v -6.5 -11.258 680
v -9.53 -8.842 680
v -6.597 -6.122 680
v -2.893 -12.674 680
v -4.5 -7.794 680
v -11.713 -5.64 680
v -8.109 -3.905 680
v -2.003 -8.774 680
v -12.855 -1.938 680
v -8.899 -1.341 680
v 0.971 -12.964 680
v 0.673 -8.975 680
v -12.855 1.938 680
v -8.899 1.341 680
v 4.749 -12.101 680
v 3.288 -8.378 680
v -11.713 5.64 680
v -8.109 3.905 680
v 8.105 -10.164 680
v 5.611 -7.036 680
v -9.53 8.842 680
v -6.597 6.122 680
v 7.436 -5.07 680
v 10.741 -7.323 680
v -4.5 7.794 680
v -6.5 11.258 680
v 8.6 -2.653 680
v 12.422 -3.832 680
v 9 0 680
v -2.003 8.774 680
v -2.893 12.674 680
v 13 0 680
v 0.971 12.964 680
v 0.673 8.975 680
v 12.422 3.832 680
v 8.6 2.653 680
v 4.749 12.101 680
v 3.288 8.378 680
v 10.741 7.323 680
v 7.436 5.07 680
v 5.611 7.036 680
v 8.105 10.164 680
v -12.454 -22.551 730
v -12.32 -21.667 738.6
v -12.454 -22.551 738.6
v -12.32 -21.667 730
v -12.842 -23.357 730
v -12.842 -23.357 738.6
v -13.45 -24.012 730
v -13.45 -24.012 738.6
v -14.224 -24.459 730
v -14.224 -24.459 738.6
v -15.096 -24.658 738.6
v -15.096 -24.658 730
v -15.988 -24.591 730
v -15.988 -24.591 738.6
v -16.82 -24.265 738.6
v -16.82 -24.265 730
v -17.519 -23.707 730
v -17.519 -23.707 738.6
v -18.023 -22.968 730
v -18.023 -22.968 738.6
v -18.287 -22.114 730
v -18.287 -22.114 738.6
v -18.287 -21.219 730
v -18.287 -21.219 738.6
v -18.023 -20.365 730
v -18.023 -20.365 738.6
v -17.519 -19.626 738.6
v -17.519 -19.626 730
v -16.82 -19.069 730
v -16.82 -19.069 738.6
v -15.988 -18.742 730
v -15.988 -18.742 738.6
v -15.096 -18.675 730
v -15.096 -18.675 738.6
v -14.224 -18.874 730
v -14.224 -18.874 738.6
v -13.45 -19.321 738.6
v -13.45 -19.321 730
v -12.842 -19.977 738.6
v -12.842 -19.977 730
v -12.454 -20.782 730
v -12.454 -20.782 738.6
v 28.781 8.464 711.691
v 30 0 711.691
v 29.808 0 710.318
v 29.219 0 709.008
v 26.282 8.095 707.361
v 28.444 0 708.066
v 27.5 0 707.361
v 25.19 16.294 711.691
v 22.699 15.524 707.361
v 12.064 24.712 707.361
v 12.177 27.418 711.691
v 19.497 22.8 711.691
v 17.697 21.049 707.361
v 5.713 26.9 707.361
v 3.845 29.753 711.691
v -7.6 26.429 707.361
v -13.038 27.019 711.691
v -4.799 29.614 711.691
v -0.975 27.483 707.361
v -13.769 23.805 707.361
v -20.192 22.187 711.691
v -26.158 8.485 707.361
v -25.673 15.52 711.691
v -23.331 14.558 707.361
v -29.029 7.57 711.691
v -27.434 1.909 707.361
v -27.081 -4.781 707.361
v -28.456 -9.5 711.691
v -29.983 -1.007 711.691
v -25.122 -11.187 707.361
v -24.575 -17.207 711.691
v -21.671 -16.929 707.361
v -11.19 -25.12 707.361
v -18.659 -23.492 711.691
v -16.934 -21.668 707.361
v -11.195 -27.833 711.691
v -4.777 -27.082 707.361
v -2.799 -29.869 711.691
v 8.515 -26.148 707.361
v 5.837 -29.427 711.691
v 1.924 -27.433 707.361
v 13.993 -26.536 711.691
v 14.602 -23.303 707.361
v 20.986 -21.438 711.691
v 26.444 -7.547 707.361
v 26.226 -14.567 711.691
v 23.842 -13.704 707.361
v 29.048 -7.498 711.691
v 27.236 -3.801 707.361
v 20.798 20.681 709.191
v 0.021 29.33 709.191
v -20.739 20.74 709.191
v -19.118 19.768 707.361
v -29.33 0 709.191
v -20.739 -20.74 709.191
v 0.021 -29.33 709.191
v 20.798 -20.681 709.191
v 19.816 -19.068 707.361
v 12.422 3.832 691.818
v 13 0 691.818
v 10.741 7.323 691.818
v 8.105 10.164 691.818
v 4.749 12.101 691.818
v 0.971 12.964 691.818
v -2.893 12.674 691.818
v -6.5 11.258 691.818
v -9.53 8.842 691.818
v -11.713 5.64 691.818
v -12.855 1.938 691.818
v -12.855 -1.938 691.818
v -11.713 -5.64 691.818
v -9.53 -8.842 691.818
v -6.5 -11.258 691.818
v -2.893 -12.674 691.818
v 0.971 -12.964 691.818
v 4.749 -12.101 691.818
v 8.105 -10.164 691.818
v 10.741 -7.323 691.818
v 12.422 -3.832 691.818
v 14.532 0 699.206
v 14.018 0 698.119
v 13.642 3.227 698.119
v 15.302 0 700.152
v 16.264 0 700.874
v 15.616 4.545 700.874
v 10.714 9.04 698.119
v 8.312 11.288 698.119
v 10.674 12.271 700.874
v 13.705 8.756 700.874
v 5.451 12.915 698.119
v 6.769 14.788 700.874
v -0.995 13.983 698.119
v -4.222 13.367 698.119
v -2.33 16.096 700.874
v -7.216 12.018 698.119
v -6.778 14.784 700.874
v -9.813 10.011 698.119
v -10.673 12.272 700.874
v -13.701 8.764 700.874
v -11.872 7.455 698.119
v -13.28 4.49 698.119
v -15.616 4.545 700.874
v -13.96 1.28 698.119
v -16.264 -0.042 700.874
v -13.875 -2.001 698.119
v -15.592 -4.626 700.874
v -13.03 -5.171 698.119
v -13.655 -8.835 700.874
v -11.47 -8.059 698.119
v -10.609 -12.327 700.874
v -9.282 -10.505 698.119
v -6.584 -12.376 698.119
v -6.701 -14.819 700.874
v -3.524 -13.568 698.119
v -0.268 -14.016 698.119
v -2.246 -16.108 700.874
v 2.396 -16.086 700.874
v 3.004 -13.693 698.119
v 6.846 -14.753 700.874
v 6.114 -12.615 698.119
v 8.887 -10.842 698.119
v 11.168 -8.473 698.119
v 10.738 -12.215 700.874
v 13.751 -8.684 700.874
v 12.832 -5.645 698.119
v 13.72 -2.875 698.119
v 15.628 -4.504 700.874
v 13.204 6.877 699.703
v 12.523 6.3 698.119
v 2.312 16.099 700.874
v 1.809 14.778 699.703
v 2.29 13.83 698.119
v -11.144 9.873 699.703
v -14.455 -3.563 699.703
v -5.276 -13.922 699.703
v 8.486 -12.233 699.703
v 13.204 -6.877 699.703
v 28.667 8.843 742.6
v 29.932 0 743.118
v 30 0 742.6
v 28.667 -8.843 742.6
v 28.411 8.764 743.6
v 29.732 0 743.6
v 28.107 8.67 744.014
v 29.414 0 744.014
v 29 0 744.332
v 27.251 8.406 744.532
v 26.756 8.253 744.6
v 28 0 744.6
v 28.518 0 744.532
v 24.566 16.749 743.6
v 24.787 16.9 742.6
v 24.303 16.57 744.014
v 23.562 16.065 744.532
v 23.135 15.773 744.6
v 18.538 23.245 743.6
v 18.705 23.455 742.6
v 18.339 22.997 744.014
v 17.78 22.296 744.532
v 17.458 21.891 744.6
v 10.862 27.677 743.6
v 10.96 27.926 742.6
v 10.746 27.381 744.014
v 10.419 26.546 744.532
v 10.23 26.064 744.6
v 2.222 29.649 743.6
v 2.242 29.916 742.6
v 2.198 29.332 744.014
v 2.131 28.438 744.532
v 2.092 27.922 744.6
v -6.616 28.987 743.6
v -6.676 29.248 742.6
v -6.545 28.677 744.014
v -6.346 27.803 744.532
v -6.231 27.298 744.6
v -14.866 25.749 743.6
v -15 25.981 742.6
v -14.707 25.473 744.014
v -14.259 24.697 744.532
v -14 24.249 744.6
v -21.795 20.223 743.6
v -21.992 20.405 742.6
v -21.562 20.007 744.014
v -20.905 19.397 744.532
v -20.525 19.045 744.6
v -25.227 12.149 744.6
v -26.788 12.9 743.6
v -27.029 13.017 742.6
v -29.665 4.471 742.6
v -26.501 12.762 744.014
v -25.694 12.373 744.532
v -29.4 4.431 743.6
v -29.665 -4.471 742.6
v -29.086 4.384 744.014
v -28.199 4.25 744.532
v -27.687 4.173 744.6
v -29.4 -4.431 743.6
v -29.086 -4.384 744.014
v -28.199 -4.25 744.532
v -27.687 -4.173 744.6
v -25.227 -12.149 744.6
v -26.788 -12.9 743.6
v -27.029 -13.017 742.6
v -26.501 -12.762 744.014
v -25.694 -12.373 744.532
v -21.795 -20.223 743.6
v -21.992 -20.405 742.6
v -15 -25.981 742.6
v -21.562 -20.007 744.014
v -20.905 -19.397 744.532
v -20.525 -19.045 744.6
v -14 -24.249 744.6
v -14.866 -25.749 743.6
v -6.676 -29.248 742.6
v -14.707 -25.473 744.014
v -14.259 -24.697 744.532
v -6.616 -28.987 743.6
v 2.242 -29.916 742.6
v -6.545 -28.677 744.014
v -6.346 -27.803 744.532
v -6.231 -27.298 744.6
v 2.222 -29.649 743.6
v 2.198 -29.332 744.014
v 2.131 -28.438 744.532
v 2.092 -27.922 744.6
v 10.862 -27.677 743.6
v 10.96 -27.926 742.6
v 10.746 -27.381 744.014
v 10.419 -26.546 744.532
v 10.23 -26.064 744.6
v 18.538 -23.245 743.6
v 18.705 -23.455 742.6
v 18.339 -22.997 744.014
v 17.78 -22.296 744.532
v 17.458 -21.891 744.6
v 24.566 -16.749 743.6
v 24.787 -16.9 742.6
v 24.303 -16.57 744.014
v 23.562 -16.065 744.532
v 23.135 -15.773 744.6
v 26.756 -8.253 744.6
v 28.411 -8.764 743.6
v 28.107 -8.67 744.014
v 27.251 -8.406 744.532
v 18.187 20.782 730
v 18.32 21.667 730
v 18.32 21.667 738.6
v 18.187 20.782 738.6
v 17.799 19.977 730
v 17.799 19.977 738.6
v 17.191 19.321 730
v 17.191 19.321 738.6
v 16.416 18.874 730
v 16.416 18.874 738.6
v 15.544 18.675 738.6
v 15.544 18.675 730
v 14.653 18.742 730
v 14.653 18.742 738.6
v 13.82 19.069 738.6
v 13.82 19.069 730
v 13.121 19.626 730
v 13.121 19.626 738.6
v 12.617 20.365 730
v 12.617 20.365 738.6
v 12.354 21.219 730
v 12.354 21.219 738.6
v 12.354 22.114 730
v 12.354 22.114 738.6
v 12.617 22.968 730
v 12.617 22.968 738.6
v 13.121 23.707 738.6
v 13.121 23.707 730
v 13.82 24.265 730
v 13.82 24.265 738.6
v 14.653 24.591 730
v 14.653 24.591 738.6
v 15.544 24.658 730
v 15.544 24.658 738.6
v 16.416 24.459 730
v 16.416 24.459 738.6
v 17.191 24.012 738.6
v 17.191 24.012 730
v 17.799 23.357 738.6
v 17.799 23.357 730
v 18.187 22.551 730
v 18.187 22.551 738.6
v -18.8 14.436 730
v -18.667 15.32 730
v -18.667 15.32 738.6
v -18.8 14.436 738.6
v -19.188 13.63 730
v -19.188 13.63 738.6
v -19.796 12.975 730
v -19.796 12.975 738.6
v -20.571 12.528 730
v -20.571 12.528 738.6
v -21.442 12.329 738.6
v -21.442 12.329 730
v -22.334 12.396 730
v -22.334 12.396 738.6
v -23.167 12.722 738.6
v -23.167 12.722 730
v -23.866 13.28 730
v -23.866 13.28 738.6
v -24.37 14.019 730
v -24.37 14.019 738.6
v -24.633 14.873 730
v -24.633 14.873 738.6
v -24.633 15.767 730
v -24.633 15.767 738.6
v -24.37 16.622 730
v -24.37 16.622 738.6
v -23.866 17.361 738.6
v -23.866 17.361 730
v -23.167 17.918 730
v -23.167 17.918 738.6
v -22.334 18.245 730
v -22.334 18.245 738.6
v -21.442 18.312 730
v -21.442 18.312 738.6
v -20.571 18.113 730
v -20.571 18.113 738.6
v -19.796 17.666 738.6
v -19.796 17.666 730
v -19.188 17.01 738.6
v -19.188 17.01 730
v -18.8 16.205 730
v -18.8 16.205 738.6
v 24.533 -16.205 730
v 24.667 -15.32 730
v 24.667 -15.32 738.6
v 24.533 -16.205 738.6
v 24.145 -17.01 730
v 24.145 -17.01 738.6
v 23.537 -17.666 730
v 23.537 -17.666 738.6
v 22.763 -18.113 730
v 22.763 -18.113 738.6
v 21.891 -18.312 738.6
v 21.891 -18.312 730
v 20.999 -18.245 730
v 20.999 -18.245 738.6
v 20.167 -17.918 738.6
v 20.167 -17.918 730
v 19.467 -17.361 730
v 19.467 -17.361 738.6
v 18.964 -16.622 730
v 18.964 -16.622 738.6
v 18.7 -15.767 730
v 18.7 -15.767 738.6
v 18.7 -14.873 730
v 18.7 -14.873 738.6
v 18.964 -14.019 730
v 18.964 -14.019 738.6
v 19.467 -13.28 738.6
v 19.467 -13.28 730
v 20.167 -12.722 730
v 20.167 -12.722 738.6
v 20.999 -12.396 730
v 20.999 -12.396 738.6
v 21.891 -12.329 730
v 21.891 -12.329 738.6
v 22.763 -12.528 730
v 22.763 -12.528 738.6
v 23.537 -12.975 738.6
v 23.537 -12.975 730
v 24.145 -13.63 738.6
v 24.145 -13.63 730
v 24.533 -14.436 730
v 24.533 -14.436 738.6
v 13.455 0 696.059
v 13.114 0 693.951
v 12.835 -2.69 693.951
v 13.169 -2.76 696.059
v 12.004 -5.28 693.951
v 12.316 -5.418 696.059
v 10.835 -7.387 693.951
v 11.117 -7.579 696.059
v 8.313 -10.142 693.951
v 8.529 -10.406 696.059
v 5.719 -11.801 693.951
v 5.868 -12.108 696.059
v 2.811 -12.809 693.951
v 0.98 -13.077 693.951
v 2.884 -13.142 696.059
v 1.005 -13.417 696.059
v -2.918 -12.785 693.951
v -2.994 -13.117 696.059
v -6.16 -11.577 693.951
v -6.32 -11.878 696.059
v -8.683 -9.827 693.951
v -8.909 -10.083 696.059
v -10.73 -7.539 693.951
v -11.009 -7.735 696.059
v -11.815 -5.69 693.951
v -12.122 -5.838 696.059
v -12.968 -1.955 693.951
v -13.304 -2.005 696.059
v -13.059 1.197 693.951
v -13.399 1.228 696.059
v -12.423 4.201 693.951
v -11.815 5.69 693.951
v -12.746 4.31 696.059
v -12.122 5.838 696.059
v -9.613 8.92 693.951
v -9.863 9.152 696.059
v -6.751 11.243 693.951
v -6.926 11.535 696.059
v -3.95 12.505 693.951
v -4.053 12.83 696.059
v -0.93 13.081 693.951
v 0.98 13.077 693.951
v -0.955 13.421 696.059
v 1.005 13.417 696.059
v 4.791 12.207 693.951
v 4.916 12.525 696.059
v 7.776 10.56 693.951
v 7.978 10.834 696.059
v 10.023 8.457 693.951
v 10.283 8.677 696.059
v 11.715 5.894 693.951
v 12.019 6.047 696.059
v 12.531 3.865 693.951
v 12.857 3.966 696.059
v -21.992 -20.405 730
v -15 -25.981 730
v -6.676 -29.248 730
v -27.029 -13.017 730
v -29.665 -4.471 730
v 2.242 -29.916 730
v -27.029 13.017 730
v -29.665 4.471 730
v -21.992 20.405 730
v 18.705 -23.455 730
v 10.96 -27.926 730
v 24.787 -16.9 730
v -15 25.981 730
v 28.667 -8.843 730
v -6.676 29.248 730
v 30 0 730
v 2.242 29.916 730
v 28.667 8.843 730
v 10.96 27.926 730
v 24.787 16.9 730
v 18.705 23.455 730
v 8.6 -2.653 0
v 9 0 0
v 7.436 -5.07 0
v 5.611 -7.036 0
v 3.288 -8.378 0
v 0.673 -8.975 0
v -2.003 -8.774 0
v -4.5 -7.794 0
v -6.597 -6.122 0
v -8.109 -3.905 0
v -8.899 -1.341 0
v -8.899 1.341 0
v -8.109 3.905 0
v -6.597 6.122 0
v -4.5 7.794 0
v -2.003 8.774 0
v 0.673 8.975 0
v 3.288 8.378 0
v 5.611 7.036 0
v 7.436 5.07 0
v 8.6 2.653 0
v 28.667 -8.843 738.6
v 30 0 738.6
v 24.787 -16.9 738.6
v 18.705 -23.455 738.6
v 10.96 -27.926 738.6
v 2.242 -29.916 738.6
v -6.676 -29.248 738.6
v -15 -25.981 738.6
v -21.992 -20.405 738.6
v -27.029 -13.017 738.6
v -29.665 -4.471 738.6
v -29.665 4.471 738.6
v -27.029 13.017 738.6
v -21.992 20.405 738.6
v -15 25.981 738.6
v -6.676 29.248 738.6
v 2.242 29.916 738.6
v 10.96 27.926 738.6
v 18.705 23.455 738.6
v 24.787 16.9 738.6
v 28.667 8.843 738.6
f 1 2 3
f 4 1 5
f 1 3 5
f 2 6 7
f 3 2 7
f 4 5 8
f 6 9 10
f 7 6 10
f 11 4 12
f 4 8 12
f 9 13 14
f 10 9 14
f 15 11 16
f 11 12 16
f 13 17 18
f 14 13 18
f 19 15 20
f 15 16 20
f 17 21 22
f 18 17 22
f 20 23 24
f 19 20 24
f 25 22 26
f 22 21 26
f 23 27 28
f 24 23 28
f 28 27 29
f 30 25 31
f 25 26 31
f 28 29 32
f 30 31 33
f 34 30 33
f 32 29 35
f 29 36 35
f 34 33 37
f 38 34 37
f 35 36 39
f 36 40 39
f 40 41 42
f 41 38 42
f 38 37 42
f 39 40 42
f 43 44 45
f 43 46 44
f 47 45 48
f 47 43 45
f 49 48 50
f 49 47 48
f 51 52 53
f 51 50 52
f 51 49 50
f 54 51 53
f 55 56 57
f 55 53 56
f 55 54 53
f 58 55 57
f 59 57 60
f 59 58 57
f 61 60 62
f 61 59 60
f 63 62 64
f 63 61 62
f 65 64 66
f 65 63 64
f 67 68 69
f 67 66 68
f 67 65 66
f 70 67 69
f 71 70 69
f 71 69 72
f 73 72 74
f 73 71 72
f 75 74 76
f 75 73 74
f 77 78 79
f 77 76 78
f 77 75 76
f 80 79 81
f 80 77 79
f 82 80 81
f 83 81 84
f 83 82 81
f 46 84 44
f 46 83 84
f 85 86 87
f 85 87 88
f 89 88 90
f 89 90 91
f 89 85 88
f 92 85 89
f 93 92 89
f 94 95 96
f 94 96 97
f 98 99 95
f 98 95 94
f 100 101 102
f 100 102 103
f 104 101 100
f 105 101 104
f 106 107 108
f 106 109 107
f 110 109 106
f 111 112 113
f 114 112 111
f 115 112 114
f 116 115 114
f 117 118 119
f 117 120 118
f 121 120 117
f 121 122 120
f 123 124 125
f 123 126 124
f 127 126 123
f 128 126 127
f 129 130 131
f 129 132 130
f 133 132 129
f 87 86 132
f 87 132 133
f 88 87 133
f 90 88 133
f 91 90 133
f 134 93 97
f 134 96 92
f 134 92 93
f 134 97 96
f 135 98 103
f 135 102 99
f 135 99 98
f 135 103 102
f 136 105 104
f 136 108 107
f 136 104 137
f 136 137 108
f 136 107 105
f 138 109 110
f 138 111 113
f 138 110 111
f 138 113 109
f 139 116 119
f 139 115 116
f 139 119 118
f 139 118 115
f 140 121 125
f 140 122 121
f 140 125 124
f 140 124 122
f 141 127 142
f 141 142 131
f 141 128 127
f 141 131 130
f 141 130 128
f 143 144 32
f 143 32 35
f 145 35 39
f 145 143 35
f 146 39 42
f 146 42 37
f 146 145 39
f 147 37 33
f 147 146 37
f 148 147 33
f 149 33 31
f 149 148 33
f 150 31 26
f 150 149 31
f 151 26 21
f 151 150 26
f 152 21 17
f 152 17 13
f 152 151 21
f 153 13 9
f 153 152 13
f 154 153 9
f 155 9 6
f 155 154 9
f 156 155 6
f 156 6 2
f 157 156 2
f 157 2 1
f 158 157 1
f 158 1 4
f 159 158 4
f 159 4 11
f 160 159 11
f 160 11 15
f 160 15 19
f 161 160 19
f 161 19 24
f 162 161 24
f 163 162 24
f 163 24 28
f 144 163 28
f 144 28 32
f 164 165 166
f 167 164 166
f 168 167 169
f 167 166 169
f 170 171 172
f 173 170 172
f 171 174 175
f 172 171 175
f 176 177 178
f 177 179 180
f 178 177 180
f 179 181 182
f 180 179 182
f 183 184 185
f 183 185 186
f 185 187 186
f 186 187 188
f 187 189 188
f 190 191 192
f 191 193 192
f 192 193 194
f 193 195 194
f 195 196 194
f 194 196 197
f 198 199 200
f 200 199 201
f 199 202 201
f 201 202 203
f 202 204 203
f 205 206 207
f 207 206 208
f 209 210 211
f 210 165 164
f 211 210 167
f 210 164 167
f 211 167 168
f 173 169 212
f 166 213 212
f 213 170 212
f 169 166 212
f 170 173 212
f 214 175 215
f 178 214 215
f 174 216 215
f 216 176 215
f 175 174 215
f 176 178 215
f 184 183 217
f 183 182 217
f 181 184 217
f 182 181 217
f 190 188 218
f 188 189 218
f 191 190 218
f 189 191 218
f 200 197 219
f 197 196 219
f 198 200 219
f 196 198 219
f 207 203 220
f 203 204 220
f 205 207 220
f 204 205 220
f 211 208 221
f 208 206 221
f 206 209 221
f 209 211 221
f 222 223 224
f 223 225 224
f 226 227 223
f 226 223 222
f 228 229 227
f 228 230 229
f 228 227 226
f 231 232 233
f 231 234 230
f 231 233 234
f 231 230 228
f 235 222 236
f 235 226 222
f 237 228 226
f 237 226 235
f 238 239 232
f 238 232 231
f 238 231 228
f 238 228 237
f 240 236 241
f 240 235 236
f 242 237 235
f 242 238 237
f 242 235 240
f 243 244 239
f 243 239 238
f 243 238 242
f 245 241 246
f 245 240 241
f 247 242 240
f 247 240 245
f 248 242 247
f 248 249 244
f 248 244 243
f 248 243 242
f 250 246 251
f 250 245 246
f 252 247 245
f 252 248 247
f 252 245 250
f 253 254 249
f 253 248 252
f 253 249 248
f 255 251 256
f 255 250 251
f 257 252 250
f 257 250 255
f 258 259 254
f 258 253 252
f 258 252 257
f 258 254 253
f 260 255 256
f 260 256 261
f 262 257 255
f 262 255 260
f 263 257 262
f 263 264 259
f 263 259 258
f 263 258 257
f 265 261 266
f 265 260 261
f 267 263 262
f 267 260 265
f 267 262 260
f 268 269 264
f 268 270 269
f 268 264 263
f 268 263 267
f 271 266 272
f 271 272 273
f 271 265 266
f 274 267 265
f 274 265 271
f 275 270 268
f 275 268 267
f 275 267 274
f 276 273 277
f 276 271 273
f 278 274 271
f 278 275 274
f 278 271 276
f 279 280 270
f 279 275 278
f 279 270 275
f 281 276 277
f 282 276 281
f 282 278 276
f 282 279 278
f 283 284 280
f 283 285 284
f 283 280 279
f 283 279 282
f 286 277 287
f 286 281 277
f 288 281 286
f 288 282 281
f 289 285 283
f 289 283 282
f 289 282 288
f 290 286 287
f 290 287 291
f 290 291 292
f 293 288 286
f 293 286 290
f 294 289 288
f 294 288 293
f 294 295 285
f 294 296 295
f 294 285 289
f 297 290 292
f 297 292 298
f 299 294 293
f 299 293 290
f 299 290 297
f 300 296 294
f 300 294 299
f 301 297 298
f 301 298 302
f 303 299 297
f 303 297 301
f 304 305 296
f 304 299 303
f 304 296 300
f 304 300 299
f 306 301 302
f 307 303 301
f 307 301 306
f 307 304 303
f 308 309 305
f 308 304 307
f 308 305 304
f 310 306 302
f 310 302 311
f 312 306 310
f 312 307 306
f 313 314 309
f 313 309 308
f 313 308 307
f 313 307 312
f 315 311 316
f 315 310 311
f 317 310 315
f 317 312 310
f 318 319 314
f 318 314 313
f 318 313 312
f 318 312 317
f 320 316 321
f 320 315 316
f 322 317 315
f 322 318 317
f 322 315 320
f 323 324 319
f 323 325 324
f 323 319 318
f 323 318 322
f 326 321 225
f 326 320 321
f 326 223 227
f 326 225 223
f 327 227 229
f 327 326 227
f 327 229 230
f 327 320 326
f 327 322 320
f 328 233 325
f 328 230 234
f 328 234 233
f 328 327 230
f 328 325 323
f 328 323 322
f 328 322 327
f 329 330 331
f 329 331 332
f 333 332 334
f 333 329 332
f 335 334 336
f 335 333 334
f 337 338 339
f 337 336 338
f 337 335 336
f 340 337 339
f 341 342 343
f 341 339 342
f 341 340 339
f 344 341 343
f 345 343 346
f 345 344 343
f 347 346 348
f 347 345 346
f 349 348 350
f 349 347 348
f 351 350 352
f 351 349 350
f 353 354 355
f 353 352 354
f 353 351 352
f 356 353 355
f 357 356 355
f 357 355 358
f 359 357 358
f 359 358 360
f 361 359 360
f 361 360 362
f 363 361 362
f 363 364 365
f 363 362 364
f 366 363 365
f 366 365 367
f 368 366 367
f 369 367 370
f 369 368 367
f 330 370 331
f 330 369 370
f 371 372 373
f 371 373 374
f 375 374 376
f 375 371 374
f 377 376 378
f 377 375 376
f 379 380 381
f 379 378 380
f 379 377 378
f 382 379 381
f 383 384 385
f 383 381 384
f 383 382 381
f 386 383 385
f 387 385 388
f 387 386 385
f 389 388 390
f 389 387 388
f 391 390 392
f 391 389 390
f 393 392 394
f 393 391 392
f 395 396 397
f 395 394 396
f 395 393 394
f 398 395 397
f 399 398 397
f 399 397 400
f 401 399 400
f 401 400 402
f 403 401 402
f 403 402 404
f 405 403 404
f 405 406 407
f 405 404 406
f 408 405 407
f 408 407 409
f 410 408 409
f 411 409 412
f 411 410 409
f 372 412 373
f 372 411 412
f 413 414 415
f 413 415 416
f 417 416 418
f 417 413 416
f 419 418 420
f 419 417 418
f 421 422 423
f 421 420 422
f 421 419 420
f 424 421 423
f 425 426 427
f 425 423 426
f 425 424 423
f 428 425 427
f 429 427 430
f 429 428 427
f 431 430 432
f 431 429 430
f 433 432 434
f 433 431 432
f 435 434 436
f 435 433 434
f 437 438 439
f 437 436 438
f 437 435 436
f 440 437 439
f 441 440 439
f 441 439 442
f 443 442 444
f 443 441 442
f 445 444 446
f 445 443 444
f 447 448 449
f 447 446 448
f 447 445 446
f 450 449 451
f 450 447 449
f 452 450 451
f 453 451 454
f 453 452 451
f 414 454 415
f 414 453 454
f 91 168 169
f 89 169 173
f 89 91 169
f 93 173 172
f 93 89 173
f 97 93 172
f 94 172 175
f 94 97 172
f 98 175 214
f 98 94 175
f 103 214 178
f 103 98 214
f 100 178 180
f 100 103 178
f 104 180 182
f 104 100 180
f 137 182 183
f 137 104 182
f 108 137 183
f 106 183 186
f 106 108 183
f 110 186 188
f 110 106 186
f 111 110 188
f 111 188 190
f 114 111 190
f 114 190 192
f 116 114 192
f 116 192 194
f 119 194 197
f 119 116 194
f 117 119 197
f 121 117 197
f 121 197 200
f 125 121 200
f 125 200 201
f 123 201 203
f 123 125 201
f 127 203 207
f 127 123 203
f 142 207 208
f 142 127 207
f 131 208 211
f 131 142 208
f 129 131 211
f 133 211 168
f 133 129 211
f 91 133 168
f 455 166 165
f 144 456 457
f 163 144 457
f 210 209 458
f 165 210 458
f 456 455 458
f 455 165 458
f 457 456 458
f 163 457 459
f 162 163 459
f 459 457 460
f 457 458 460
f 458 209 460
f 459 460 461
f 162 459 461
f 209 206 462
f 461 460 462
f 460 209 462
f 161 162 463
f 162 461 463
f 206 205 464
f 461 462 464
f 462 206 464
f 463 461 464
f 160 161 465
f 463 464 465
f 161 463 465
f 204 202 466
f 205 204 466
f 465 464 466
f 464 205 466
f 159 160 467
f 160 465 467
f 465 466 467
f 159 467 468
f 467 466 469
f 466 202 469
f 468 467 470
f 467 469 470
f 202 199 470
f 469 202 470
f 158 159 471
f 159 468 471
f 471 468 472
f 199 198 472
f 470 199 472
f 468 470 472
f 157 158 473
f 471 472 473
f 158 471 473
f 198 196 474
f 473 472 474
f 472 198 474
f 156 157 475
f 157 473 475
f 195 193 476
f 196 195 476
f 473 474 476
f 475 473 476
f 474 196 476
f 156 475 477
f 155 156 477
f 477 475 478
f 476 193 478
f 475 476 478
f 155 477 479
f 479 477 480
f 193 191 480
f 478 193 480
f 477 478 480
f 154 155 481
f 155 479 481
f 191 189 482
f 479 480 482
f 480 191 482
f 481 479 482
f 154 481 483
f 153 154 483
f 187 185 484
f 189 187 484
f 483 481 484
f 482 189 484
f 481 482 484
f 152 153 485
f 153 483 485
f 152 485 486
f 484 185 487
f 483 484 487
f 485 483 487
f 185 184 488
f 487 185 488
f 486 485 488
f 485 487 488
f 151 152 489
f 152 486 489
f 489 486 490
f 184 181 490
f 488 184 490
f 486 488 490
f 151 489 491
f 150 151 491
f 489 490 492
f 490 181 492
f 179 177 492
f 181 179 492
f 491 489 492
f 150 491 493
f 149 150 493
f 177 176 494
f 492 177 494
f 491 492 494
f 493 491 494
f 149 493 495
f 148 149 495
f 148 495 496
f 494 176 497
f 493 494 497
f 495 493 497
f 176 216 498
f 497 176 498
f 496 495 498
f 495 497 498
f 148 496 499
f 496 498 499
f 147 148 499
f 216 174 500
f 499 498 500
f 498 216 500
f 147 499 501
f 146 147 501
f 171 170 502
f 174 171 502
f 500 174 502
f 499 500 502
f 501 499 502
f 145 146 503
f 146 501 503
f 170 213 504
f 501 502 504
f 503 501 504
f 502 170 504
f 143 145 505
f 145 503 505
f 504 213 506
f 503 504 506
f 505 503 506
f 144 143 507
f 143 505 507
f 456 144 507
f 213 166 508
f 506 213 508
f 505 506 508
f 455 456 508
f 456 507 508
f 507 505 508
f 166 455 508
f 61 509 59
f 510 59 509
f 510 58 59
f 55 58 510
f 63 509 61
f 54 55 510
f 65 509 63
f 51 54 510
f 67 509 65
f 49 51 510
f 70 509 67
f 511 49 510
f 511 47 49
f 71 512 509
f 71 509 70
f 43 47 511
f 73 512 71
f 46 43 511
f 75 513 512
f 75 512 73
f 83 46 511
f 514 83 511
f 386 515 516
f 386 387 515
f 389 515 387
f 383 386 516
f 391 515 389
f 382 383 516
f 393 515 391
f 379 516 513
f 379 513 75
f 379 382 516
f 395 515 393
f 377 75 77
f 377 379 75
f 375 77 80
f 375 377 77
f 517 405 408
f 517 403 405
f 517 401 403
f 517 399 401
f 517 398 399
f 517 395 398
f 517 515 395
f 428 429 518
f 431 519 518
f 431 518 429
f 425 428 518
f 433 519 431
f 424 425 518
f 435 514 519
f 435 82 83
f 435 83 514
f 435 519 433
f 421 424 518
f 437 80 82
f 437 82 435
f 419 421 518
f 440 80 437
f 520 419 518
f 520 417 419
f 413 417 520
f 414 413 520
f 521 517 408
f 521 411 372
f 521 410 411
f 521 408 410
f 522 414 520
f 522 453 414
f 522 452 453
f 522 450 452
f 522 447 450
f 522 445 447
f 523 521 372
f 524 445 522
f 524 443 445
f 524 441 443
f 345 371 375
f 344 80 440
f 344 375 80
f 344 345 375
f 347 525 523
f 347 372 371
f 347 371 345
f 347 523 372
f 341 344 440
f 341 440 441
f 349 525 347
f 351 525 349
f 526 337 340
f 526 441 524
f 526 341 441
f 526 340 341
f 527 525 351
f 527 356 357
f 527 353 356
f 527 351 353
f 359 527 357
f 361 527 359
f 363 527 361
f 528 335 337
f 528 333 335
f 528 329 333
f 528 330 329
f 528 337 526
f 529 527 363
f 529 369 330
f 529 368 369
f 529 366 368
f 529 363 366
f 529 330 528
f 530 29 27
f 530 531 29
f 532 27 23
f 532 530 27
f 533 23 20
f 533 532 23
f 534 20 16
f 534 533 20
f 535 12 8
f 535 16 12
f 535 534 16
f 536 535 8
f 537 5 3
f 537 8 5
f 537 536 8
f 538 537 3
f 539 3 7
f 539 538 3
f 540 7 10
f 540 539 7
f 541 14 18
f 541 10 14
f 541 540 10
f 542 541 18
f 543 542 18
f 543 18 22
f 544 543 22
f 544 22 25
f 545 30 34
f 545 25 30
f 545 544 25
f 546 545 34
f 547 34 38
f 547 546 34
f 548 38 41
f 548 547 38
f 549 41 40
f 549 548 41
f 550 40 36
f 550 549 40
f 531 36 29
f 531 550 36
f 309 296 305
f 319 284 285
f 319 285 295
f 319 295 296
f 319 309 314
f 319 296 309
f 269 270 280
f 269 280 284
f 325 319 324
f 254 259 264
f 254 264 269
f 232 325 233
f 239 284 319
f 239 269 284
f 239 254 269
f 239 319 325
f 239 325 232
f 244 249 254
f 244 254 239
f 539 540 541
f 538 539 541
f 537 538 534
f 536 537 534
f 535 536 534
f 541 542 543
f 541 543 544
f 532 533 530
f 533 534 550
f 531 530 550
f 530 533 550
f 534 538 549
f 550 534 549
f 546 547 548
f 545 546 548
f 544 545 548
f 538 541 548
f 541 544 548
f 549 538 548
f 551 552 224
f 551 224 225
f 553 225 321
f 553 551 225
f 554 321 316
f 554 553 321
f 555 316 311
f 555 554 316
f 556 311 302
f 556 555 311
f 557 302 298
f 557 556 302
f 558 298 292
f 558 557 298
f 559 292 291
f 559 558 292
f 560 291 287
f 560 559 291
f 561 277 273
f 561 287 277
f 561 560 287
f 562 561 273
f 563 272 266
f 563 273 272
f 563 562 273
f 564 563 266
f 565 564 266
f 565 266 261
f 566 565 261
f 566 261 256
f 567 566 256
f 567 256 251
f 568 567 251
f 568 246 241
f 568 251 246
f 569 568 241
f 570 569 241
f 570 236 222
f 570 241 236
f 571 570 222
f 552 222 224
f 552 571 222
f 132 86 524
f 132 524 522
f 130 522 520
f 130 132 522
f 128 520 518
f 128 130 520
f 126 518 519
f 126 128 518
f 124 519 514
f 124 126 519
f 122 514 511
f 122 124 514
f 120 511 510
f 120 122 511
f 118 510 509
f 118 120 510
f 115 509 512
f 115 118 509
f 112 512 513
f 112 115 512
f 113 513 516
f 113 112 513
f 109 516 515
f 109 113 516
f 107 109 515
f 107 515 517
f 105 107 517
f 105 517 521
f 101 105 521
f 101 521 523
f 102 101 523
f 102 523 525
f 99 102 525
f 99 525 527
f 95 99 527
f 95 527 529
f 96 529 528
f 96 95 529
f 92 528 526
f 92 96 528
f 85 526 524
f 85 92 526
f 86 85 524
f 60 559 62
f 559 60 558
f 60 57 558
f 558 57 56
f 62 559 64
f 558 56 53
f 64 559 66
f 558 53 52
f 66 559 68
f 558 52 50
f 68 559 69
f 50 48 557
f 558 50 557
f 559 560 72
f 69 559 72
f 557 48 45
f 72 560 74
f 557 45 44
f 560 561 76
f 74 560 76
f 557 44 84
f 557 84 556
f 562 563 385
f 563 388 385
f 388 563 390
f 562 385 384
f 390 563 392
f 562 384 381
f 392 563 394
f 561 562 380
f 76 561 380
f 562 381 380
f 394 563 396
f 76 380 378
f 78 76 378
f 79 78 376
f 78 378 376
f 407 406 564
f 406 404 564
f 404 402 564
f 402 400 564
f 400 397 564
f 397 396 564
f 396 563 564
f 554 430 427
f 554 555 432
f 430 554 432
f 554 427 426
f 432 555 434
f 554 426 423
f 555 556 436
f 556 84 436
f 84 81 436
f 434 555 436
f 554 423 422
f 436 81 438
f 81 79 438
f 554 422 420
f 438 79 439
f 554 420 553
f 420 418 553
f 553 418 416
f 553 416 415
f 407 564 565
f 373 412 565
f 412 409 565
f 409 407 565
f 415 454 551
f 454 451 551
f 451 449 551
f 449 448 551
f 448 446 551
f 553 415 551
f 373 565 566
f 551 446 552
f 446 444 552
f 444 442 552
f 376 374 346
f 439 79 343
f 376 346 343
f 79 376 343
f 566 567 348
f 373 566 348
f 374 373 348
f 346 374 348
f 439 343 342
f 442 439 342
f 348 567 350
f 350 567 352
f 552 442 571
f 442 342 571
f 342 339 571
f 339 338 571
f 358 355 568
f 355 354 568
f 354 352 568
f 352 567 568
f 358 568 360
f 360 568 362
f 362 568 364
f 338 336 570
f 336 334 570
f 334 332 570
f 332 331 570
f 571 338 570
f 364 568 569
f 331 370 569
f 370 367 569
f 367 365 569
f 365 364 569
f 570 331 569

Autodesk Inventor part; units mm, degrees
ref_plane "YZ Plane" through (0, 0, 0) normal (1, 0, 0) x (0, 1, 0)
ref_plane "XZ Plane" through (0, 0, 0) normal (0, 1, 0) x (-1, 0, 0)
ref_plane "XY Plane" through (0, 0, 0) normal (0, 0, 1) x (1, 0, 0)
sketch "Sketch1" plane through (0, 0, 0) normal (0, 0, 1) x (1, 0, 0)
  circle A0 centre (0, 0) radius 9
  dimension "d0" = 18
extrude "Extrusion1" add sketch "Sketch1" along normal blind 700
sketch "Sketch2" plane through (0, 0, 700) normal (0, 0, 1) x (1, 0, 0)
  circle A0 centre (0, 0) radius 9 projected
  circle A1 centre (0, 0) radius 30
  circle A2 centre (0, 0) radius 13
  dimension "d3" = 60
  dimension "d33" = 26
extrude "Extrusion2" add sketch "Sketch2" along normal blind 30 contours A0 | A1 | A2
sketch "Sketch3" plane through (0, 0, 730) normal (0, 0, 1) x (1, 0, 0)
  circle A0 centre (0, 0) radius 30 projected
  line L0 (-24.495, 17.3203) -> (0, 0) construction
  line L1 (24.495, -17.3203) -> (0, 0) construction
  line L2 (0, 0) -> (17.3203, 24.495) construction
  line L3 (0, 0) -> (-17.3203, -24.495) construction
  circle A1 centre (-21.6666, 15.3203) radius 3
  circle A2 centre (-15.3203, -21.6666) radius 3
  circle A3 centre (21.6666, -15.3203) radius 3
  circle A4 centre (15.3203, 21.6666) radius 3
  dimension "d18" = 6
  dimension "d19" = 2
  dimension "d22" = 360
extrude "Extrusion3" add sketch "Sketch3" along normal blind 8.6 contours A1 | A2 | A3 | A4
sketch "Sketch4" plane through (0, 0, 738.6) normal (0, 0, 1) x (1, 0, 0)
  circle A0 centre (0, 0) radius 30
  dimension "d9" = 60
extrude "Extrusion4" add sketch "Sketch4" along normal blind 6
chamfer "Chamfer2" distance 15.25 angle 30 1 edges at (-30, 0, 700) measured on face at (22.6222, -3.1111, 700)
fillet "Fillet5" radius 5 1 edges at (-30, 0, 708.8046)
extrude "Extrusion5" add sketch "Sketch2" against normal blind 20 contours A2
fillet "Fillet7" radius 20 1 edges at (-13, 0, 700)
fillet "Fillet8" radius 5 1 edges at (-14.75, 0, 700)
fillet "Fillet9" radius 2 1 edges at (-30, 0, 744.6)
properties part number "anemo"
